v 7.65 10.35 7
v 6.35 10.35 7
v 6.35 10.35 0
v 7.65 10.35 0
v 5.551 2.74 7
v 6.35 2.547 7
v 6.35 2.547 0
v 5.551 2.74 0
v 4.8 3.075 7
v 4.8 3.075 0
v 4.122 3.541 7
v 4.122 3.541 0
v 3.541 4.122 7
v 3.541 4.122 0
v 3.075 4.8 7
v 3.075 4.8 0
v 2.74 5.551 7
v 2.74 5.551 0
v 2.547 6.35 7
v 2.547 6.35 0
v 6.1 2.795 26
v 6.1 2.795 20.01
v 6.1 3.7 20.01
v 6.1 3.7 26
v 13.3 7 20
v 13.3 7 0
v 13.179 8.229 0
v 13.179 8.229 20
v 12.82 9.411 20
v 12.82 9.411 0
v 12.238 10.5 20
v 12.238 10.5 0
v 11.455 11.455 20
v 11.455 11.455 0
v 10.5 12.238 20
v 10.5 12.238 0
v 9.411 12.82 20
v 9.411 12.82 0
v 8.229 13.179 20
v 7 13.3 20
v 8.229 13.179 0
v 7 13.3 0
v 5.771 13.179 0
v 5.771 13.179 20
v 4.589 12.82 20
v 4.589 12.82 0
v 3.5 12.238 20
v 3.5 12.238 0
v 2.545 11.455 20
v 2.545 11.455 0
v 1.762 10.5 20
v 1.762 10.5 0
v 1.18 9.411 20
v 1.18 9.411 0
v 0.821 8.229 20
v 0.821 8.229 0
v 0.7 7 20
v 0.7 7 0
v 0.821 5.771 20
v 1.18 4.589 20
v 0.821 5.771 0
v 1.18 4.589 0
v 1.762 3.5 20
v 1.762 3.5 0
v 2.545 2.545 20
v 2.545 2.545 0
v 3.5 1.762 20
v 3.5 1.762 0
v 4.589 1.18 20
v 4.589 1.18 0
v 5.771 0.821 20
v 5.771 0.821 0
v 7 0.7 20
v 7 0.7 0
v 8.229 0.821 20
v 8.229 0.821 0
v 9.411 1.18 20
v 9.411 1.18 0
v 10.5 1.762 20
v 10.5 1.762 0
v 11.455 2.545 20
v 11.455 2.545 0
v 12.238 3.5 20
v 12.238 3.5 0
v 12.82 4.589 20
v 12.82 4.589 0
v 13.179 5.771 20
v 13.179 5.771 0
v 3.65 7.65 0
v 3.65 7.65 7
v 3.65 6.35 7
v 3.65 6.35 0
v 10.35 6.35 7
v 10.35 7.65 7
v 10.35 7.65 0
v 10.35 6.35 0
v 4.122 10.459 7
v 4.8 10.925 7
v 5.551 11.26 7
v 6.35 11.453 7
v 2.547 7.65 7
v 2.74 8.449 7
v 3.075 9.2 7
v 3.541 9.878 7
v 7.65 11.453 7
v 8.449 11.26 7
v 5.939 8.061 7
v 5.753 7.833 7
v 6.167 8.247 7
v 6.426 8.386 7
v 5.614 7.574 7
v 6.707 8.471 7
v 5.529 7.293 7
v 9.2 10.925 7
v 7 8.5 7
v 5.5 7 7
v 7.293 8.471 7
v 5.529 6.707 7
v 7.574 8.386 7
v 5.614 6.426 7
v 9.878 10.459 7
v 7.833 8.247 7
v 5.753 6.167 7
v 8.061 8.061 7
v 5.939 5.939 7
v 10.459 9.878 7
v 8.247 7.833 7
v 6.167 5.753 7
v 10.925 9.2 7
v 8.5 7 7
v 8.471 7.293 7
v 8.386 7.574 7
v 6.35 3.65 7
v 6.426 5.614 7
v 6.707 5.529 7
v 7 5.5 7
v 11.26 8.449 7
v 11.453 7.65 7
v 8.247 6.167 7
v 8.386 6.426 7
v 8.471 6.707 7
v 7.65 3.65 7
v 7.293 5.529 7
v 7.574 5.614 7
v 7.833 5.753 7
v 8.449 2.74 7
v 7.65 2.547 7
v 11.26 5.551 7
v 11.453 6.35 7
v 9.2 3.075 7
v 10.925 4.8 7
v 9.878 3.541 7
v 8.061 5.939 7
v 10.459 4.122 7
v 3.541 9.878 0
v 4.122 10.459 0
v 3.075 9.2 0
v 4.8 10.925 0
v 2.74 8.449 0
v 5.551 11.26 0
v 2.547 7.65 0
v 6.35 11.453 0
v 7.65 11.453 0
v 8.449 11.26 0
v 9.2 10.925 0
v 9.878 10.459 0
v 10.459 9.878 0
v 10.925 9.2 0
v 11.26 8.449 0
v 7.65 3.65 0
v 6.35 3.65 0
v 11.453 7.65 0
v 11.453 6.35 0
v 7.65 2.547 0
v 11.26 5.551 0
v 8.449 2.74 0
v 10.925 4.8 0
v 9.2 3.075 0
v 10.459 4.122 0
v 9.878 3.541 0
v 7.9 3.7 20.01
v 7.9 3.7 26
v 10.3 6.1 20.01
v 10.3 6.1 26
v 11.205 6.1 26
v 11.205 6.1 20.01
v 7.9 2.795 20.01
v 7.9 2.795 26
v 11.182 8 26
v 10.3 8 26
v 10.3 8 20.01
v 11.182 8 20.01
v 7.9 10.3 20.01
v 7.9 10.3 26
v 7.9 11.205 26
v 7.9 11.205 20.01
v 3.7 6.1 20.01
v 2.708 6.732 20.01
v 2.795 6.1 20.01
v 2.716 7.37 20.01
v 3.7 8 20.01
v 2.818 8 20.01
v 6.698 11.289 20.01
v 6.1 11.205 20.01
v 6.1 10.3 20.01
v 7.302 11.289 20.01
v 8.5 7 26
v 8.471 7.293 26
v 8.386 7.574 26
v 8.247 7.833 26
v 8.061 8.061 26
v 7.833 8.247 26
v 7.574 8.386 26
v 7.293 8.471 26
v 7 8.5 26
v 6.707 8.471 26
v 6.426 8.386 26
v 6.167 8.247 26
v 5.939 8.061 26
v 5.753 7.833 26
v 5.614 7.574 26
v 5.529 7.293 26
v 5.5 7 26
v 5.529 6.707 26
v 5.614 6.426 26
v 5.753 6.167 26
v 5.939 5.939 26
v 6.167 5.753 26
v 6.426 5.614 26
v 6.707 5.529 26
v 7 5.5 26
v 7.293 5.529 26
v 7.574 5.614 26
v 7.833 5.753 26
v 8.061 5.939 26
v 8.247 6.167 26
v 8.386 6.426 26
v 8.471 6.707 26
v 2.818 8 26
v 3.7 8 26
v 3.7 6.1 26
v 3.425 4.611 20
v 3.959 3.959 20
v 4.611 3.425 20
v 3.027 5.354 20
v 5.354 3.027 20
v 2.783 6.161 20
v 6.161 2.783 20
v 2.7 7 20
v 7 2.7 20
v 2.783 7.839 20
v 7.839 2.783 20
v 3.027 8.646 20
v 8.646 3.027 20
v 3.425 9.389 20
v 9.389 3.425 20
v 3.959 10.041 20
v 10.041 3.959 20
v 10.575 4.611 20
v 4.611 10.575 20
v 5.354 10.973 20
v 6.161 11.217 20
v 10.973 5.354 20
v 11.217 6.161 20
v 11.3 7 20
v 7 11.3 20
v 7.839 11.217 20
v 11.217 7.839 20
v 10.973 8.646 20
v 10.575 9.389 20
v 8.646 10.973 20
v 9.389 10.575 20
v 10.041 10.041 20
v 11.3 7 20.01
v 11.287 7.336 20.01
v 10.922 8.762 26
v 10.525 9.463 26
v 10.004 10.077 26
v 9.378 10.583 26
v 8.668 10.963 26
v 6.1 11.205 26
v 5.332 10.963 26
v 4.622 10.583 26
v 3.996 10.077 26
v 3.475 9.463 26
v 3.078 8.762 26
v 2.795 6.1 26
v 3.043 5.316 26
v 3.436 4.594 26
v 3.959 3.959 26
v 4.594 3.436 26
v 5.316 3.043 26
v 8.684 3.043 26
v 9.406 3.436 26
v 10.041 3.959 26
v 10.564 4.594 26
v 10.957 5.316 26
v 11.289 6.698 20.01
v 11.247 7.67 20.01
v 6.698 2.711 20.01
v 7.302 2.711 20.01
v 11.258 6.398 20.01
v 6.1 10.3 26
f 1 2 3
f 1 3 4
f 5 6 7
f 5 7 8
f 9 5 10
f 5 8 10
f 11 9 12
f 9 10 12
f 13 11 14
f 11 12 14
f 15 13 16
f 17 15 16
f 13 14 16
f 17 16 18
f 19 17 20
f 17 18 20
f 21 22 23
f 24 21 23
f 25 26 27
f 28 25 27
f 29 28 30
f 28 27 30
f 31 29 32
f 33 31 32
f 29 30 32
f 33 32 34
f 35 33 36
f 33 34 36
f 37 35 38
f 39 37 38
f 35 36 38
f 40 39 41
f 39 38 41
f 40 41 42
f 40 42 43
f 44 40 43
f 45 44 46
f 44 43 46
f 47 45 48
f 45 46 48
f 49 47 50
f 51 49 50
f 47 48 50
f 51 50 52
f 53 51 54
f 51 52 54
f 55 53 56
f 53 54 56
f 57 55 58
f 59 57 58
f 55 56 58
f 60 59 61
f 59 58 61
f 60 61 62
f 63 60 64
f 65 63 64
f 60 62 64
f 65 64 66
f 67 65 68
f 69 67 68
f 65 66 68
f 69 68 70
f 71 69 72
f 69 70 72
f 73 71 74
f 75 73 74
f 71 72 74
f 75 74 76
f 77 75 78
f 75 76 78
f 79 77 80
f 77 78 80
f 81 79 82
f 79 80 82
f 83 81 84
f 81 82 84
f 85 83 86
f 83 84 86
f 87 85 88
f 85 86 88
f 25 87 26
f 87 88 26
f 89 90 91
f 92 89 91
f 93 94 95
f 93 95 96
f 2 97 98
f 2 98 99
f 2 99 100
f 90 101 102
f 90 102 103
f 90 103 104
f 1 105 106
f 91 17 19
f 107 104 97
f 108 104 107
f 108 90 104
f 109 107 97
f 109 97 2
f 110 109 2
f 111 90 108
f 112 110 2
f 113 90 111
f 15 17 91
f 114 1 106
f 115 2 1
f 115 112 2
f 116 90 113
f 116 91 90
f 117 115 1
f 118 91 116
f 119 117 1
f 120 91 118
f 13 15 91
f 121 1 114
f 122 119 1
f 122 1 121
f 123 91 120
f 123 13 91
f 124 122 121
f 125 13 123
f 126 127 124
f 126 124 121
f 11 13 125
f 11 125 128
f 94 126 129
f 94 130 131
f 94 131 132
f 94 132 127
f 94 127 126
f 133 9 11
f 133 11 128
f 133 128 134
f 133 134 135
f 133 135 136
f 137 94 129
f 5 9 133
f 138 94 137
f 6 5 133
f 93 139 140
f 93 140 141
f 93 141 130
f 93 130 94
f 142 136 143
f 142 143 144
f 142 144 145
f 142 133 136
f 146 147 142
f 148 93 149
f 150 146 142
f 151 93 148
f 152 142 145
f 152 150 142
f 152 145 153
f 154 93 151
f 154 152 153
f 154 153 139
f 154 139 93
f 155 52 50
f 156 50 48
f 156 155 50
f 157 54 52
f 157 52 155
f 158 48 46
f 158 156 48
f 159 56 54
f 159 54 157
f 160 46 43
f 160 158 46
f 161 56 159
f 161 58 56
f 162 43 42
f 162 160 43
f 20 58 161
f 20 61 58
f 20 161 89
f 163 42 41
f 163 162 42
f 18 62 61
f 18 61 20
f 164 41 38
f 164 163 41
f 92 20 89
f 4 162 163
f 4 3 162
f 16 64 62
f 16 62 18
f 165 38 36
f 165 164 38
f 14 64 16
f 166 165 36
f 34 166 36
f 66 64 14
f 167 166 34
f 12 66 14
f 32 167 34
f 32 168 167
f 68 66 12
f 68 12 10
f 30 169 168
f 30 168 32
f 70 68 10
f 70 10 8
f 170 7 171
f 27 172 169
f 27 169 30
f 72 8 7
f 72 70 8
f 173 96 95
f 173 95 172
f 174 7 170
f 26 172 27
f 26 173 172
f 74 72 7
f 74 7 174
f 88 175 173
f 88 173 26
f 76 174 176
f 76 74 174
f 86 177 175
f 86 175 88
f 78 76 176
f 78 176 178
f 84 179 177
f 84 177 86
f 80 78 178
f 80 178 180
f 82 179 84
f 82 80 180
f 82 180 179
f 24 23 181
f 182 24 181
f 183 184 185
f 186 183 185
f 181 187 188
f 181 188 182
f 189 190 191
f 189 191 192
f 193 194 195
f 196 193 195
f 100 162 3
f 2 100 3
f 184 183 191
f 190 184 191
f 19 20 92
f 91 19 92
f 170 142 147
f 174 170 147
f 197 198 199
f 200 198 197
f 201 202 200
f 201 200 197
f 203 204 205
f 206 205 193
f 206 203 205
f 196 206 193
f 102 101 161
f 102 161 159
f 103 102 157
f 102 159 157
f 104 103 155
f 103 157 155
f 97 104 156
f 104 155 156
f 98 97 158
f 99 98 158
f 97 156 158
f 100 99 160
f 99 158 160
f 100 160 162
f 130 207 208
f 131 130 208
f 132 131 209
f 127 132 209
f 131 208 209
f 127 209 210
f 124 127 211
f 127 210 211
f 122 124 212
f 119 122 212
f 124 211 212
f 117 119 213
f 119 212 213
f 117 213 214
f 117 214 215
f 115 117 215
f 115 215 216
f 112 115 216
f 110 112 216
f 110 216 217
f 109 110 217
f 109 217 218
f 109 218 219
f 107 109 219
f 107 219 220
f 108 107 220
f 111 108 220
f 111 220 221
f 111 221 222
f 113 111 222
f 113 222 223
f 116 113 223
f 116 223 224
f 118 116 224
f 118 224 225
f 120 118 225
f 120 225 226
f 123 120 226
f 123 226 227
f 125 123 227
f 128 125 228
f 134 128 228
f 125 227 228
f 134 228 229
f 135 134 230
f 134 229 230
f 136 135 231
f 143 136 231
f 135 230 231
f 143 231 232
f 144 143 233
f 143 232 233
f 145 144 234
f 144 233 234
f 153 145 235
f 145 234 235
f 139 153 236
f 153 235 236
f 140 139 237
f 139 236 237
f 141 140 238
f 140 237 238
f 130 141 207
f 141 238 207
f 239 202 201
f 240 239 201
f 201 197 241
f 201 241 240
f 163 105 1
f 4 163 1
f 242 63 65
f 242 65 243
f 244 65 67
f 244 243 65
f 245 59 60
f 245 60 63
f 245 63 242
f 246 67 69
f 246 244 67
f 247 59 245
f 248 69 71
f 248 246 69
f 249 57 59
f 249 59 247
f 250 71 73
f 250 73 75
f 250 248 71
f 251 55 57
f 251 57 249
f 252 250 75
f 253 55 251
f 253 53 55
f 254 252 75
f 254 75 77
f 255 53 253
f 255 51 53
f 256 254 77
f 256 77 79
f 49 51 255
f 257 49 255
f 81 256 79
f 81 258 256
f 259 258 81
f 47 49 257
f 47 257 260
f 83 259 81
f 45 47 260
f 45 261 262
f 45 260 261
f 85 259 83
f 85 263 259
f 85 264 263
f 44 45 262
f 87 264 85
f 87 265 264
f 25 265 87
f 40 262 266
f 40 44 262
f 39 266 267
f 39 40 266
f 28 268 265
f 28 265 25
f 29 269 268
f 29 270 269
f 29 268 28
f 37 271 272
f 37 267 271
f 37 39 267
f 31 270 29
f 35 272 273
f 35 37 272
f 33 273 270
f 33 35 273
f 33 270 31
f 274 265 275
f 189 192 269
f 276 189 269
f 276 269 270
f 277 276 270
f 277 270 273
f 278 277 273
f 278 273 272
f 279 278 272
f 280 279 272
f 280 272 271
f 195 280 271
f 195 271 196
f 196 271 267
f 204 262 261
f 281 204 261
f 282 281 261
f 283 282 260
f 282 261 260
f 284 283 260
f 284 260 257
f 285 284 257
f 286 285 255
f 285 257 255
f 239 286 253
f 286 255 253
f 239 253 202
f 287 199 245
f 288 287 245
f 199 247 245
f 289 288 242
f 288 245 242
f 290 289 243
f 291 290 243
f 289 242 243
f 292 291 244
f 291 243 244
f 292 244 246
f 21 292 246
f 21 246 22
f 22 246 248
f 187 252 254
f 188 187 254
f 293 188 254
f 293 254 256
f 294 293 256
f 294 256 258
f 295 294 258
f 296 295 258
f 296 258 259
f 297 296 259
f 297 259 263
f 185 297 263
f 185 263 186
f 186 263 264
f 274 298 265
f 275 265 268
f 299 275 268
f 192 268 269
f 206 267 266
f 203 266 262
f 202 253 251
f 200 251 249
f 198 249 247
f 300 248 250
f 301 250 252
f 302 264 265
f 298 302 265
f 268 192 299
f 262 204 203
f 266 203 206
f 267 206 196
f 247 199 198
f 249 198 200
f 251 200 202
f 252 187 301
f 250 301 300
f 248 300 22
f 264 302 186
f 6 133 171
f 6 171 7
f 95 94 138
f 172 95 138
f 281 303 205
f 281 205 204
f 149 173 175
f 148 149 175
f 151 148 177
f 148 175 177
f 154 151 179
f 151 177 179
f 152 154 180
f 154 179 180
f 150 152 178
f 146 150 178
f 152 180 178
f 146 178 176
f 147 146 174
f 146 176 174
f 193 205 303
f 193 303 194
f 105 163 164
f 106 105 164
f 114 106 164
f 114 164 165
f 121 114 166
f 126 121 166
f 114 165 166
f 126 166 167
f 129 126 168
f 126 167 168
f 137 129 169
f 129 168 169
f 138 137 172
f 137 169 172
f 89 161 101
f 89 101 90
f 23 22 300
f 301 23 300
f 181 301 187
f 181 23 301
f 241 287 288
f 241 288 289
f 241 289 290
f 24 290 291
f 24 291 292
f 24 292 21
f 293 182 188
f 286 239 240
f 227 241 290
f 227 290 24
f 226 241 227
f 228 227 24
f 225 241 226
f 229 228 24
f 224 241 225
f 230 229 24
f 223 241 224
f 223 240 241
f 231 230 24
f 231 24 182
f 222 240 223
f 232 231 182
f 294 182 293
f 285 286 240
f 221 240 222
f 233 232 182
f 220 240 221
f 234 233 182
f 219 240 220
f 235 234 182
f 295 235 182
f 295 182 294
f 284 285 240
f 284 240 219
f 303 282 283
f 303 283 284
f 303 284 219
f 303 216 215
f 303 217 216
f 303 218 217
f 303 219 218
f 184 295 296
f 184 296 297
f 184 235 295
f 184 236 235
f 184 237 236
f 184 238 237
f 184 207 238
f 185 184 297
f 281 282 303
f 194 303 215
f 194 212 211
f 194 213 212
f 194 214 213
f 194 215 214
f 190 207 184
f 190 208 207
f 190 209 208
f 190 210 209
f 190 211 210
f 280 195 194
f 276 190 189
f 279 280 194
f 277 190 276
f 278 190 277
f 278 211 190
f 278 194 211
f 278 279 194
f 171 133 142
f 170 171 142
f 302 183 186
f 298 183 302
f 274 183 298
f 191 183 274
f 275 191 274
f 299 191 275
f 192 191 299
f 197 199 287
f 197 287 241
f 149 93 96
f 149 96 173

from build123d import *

# Parameters (mm, degrees)
SKETCH_R        = 6.3
PAD_DEPTH       = 20
SKETCH001_R     = 4.3
PAD001_DEPTH    = 6
SKETCH002_W     = 1.8
SKETCH002_H     = 1.7
SKETCH002_W_2   = 1.4
SKETCH002_H_2   = 1.9
SKETCH002_W_3   = 1.7
POCKET_DEPTH    = 5.99
SKETCH003_R     = 4.5
POCKET001_DEPTH = 7
SKETCH004_W     = 1.3
SKETCH004_H     = 1.5
SKETCH004_W_2   = 1.5
SKETCH004_H_2   = 1.3
PAD002_DEPTH    = 7
SKETCH005_R     = 1.5
POCKET002_DEPTH = 50


with BuildPart() as part:
    # Sketch → Pad (new body)
    with BuildSketch(Plane.XY):
        with Locations((7, 7)):
            Circle(SKETCH_R)
    extrude(amount=PAD_DEPTH)

    # Sketch001 (on Face3 of Pad) → Pad001 (join)
    with BuildSketch(Plane.XY.offset(20)):
        with Locations((7, 7)):
            Circle(SKETCH001_R)
    extrude(amount=PAD001_DEPTH)

    # Sketch002 (on Face5 of Pad001) → Pocket (cut)
    with BuildSketch(Plane.XY.offset(26)):
        with Locations((7, 11.15)):
            Rectangle(SKETCH002_W, SKETCH002_H)
        with Locations((7, 2.85)):
            Rectangle(SKETCH002_W, SKETCH002_H)
        with Locations((3, 7.05)):
            Rectangle(SKETCH002_W_2, SKETCH002_H_2)
        with Locations((11.15, 7.05)):
            Rectangle(SKETCH002_W_3, SKETCH002_H_2)
    extrude(amount=-POCKET_DEPTH, mode=Mode.SUBTRACT)

    # Sketch003 (on Face2 of Pocket) → Pocket001 (cut)
    with BuildSketch(Plane(origin=(0, 0, 0), x_dir=(1, 0, 0), z_dir=(0, 0, -1))):
        with Locations((7, -7)):
            Circle(SKETCH003_R)
    extrude(amount=-POCKET001_DEPTH, mode=Mode.SUBTRACT)

    # Sketch004 (on Face6 of Pocket001) → Pad002 (join)
    with BuildSketch(Plane(origin=(0, 0, 7), x_dir=(1, 0, 0), z_dir=(0, 0, -1))):
        with Locations((7, -2.9)):
            Rectangle(SKETCH004_W, SKETCH004_H)
        with Locations((7, -11.1)):
            Rectangle(SKETCH004_W, SKETCH004_H)
        with Locations((11.1, -7)):
            Rectangle(SKETCH004_W_2, SKETCH004_H_2)
        with Locations((2.9, -7)):
            Rectangle(SKETCH004_W_2, SKETCH004_H_2)
    extrude(amount=PAD002_DEPTH)

    # Sketch005 (on Face28 of Pad002) → Pocket002 (cut)
    with BuildSketch(Plane.XY.offset(26)):
        with Locations((7, 7)):
            Circle(SKETCH005_R)
    extrude(amount=-POCKET002_DEPTH, mode=Mode.SUBTRACT)


solid = part.part
